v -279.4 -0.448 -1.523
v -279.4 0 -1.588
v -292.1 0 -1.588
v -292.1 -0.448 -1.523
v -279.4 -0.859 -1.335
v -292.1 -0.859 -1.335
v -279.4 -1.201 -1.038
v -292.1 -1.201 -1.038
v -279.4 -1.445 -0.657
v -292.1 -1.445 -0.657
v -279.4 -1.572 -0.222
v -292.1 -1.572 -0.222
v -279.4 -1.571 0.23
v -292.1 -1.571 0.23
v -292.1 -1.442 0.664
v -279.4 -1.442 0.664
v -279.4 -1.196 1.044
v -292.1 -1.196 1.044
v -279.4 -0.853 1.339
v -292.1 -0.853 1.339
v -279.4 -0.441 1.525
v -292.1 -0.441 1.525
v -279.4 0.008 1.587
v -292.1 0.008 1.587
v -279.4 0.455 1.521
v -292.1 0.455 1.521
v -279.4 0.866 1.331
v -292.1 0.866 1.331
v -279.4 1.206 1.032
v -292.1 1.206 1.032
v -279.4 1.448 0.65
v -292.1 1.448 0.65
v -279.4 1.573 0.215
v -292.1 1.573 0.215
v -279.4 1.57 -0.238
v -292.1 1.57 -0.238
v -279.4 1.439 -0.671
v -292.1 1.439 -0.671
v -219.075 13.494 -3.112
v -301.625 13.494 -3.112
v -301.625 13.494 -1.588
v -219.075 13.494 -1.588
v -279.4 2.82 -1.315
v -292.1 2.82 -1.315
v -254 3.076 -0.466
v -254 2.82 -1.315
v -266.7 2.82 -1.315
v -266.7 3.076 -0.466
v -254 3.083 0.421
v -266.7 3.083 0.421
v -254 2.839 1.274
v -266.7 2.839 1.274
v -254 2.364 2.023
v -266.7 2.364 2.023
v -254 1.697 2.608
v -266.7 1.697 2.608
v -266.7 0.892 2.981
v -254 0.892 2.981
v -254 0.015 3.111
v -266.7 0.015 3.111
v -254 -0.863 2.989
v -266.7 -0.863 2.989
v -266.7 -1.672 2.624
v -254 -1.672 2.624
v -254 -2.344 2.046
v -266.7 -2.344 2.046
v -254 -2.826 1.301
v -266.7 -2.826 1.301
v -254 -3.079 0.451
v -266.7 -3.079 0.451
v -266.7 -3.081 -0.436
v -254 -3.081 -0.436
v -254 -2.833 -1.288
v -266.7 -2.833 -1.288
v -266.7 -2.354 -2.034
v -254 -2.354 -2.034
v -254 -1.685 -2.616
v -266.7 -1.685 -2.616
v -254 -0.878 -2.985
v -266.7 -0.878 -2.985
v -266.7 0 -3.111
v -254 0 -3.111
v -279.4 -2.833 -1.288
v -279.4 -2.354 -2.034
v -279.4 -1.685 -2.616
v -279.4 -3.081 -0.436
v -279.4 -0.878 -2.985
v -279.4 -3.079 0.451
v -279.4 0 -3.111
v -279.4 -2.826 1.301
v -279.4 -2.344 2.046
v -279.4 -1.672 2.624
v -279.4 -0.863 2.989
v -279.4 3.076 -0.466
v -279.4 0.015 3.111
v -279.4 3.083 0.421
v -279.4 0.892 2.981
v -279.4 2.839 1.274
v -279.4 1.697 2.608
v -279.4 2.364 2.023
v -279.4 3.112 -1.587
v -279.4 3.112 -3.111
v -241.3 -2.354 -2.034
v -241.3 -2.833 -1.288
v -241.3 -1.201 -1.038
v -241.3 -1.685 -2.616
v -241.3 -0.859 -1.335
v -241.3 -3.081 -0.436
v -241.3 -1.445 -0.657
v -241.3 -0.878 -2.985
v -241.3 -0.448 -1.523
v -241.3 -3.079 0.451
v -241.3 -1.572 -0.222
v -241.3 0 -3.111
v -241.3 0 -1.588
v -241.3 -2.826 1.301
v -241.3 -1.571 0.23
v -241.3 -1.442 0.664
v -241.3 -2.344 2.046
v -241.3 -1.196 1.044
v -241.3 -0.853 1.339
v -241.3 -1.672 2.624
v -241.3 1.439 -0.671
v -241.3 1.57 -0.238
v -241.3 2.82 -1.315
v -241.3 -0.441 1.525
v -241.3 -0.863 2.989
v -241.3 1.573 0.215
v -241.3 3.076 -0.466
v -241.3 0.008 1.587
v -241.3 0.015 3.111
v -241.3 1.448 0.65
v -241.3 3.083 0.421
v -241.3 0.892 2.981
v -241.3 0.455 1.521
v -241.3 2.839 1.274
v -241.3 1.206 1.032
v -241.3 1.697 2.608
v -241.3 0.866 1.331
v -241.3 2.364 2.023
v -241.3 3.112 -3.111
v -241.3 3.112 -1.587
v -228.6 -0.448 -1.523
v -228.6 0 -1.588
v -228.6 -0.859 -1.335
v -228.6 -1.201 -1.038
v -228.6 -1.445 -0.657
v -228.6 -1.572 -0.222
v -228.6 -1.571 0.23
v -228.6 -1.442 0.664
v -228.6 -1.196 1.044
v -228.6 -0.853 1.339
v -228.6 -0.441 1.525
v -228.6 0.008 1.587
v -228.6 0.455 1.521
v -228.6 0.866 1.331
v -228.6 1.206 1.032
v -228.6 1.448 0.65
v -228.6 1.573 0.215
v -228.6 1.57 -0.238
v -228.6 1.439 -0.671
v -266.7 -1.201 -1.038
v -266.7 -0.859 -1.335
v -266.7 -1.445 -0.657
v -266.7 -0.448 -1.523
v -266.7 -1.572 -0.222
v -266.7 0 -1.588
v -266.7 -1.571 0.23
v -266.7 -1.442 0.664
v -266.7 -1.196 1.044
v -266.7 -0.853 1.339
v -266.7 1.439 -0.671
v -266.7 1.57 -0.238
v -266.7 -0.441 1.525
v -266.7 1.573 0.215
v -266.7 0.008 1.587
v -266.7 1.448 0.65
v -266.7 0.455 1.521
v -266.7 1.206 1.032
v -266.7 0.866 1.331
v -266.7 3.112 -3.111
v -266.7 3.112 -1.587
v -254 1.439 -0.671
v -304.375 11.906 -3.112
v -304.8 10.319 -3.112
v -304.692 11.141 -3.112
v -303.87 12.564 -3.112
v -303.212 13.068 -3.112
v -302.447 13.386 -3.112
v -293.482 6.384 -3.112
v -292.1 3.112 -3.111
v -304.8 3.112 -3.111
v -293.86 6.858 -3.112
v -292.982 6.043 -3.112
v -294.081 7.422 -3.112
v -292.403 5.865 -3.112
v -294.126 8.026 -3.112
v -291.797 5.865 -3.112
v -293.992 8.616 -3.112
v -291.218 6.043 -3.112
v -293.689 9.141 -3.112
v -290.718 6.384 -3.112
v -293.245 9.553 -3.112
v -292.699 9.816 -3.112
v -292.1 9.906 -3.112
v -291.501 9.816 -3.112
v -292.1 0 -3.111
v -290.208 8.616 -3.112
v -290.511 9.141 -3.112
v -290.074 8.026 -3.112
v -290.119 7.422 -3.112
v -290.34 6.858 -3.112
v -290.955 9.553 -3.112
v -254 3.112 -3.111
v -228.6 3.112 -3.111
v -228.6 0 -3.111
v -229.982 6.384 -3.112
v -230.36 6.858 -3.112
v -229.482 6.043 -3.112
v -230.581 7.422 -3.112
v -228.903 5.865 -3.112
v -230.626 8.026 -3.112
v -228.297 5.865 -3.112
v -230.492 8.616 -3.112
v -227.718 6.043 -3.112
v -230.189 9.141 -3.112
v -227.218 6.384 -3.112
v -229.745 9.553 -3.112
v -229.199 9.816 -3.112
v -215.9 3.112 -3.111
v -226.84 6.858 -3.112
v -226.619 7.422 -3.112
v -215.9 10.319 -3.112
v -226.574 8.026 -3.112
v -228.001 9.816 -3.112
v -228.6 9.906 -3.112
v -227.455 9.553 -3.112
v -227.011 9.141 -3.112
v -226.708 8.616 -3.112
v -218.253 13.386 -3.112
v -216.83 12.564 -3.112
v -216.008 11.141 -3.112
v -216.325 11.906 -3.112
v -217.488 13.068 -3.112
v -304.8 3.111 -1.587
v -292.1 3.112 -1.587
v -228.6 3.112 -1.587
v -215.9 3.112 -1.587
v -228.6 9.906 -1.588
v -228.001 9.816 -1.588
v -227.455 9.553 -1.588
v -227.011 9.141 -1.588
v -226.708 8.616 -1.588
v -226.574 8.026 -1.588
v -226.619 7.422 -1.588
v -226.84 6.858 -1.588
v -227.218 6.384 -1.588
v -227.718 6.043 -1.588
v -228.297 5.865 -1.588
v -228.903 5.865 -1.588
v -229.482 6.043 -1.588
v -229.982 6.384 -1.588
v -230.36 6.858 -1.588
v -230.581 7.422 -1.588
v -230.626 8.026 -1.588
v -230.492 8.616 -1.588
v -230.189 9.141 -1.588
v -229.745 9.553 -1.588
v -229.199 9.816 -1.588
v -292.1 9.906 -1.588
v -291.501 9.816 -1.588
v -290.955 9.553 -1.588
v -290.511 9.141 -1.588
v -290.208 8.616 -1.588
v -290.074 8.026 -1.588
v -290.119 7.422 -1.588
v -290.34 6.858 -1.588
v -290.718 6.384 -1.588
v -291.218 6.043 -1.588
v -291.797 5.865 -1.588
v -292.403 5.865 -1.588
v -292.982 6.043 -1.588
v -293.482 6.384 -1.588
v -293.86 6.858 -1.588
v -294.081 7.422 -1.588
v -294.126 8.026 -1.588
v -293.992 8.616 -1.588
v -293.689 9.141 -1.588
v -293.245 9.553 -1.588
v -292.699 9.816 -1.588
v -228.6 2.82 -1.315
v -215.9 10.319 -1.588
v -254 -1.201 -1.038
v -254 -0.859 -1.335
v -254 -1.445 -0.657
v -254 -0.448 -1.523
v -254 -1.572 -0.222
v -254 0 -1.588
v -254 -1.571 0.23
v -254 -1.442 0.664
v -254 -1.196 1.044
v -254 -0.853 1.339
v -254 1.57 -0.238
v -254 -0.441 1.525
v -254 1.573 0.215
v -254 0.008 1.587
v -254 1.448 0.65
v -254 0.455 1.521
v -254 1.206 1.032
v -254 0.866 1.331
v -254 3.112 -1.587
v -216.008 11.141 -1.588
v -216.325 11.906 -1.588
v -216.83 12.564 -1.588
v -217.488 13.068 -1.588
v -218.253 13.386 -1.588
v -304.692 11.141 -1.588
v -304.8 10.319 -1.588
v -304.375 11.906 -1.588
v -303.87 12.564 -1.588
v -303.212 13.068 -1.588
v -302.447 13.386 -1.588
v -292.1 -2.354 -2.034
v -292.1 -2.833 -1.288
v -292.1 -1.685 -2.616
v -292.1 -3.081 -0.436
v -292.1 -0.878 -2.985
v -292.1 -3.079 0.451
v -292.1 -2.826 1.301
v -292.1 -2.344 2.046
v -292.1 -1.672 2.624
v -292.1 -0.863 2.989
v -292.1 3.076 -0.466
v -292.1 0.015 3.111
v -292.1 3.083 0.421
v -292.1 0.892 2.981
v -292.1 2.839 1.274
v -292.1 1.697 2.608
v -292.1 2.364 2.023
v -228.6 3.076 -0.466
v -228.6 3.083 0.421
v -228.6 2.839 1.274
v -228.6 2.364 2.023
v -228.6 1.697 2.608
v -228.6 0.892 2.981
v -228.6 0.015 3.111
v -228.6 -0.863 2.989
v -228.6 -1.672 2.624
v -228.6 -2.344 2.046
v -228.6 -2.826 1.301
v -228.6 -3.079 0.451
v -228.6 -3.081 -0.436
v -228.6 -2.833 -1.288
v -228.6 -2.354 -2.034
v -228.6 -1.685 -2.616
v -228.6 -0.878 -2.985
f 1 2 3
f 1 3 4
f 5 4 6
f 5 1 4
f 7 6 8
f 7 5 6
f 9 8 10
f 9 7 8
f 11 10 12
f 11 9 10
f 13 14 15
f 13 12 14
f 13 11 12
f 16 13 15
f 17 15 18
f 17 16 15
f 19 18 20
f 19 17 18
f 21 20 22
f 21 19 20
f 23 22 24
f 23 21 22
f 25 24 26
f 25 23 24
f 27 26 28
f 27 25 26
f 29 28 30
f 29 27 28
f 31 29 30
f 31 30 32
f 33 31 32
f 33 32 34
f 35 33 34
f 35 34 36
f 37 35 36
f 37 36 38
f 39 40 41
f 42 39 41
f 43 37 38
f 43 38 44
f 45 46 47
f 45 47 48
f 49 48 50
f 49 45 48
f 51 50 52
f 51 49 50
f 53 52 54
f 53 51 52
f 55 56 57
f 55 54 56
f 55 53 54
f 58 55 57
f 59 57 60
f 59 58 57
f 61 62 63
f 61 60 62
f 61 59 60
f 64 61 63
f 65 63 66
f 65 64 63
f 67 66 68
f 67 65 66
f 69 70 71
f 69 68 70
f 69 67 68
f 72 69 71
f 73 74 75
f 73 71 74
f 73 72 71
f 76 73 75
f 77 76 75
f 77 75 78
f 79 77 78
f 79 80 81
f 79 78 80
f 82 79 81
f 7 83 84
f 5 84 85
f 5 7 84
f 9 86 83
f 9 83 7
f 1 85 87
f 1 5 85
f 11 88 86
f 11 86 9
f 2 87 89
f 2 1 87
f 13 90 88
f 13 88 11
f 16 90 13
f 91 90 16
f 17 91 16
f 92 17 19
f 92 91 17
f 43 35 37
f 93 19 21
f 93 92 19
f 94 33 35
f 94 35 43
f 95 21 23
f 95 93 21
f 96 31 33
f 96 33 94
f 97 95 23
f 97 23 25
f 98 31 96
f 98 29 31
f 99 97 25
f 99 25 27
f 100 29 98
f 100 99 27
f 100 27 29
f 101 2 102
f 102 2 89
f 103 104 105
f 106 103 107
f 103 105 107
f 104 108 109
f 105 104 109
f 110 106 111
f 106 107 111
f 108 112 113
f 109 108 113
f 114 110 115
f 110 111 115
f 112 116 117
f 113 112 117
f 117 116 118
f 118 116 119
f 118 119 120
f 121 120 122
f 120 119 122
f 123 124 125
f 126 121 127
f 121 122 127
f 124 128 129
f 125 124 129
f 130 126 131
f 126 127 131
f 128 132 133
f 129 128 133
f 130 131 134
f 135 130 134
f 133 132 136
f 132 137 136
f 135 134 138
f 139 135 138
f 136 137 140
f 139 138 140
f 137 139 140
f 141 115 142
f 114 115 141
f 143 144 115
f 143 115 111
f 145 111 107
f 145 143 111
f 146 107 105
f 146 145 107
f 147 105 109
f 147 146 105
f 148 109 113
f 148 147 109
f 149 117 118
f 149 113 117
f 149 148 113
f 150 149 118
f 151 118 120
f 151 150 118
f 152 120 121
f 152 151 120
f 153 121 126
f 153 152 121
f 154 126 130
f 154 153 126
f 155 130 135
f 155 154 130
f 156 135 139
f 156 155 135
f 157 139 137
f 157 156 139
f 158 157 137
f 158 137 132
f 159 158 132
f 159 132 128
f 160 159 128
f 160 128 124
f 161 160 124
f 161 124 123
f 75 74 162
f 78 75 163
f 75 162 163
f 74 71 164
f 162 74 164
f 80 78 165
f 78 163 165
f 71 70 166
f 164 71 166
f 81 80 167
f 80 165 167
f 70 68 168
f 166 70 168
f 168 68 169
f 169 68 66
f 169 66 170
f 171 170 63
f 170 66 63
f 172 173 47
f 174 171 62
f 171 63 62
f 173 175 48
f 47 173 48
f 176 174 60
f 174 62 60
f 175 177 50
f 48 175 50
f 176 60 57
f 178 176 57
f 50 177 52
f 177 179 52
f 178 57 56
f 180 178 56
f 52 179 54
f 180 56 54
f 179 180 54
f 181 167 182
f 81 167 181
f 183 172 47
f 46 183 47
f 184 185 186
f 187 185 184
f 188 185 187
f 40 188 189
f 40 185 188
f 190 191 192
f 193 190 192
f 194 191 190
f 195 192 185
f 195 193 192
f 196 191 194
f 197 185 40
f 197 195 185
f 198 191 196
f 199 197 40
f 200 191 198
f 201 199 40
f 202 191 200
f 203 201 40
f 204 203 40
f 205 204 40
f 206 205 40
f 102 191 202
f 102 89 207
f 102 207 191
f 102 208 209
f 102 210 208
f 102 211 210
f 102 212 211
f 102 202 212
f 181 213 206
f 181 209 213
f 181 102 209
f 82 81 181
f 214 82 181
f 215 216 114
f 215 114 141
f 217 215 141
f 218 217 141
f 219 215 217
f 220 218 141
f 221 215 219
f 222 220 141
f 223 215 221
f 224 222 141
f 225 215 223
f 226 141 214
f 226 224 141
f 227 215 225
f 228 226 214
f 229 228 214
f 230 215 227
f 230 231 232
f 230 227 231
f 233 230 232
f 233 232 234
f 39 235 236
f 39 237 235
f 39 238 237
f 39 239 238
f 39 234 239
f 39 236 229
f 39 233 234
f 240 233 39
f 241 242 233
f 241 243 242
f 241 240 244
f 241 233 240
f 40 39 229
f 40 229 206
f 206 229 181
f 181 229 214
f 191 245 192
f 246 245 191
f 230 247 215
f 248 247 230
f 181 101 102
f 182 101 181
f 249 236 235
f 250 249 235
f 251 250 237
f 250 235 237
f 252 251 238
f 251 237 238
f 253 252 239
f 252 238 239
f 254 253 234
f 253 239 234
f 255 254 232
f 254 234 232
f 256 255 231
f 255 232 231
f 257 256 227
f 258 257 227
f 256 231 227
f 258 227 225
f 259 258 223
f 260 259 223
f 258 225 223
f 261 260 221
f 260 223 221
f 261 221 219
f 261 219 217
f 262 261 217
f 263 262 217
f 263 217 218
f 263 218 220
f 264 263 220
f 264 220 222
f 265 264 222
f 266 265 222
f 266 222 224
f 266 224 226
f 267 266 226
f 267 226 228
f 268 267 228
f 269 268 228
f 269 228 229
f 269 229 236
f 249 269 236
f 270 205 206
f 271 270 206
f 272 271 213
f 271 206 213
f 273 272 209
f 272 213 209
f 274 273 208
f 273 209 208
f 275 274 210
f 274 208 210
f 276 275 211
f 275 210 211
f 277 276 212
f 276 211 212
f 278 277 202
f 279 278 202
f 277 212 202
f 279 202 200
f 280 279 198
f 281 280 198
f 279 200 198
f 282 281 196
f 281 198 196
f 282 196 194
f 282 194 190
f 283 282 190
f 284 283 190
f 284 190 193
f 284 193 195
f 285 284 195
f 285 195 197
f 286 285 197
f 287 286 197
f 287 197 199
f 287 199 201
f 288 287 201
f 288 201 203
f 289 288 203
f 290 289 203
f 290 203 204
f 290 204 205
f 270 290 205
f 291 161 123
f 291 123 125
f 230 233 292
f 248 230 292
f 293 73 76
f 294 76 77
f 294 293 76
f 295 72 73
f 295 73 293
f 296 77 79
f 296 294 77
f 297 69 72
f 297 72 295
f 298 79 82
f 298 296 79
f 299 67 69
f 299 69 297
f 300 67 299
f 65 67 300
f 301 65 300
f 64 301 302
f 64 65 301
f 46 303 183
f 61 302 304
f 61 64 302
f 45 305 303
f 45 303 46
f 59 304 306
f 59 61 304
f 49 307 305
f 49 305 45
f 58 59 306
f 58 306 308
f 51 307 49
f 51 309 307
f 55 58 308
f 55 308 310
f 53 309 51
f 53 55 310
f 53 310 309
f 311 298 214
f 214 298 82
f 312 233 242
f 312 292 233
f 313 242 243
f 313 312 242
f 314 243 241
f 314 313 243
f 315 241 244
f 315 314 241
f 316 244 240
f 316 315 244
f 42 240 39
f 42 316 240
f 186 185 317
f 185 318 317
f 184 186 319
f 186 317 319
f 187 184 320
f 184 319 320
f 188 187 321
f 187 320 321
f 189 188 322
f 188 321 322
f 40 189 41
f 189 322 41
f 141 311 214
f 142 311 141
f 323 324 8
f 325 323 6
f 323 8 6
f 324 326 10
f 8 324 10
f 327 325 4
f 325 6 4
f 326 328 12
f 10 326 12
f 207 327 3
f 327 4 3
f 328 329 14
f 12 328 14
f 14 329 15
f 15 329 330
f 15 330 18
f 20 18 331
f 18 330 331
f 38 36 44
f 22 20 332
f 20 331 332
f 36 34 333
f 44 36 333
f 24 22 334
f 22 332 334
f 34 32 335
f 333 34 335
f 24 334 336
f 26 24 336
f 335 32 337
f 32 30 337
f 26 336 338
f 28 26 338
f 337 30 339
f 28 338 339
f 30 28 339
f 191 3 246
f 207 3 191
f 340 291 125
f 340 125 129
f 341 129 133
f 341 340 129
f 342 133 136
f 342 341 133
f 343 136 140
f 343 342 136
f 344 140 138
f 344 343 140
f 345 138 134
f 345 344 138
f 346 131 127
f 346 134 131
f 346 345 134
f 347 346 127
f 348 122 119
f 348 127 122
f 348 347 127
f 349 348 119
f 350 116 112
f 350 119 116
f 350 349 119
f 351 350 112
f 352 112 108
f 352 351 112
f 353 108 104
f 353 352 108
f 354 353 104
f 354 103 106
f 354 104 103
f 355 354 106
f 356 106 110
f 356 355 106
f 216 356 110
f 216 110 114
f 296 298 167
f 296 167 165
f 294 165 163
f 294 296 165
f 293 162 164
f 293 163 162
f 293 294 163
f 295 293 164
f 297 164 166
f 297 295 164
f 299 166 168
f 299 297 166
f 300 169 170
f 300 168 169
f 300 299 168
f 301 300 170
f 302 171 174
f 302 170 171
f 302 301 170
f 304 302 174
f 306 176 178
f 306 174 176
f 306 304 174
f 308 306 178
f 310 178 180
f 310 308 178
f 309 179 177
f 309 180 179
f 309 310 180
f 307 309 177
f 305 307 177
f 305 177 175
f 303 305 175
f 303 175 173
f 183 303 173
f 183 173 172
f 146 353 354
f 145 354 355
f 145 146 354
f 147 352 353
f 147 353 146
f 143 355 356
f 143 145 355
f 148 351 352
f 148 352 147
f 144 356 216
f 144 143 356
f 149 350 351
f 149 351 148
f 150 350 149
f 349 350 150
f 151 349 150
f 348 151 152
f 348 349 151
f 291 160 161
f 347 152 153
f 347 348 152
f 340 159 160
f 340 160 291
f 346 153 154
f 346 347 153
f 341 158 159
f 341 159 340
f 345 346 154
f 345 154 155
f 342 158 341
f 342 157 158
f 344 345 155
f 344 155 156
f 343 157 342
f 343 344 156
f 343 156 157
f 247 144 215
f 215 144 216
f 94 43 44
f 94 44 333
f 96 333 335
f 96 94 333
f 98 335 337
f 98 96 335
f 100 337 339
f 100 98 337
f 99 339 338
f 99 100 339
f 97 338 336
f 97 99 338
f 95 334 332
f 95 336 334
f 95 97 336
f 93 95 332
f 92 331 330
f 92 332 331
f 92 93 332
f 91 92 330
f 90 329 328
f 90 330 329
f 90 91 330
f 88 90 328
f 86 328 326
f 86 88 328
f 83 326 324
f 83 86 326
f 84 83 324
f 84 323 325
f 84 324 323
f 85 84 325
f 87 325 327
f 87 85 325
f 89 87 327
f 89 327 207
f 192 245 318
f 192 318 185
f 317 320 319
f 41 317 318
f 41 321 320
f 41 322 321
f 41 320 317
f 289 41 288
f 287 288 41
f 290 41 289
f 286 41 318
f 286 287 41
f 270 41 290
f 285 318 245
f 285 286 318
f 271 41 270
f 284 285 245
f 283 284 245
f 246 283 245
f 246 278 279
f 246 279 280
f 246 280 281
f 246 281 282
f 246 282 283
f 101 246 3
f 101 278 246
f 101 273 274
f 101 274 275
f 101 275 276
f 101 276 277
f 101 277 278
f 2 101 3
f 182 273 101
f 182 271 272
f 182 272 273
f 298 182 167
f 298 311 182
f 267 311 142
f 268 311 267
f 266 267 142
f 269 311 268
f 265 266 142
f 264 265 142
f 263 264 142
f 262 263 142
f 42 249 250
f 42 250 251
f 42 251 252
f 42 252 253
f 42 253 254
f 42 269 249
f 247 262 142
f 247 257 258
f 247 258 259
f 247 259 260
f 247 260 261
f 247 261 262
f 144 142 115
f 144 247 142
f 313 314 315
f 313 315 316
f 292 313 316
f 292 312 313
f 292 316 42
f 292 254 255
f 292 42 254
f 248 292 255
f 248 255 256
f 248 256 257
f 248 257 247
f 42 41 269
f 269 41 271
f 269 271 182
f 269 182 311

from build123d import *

# Parameters (mm, degrees)
BOSS_EXTRUDE1_DEPTH = 304.8
SKETCH4_W           = 12.7
SKETCH4_H           = 6.223
CUT_EXTRUDE1_DEPTH  = 306.114409233
LPATTERN1_COUNT     = 24
LPATTERN1_PITCH     = 25.4
BOSS_EXTRUDE2_DEPTH = 609.6
SKETCH6_W           = 12.7
SKETCH6_H           = 6.223
CUT_EXTRUDE2_DEPTH  = 306.114409233
LPATTERN2_COUNT     = 24
LPATTERN2_PITCH     = 25.4
SKETCH7_R           = 1.5875
BOSS_EXTRUDE3_DEPTH = 609.6
CHAMFER1_SIZE       = 0.3175
CUT_EXTRUDE3_START  = -88.9
SKETCH8_W           = 11.762471384
SKETCH8_H           = 30.066276354
CUT_EXTRUDE3_DEPTH  = 521.857265411
FILLET1_R           = 3.175
SKETCH9_R           = 2.032
SKETCH9_R_2         = 2.031999998
CUT_EXTRUDE4_DEPTH  = 306.162001268


with BuildPart() as part:
    # Sketch3 → Boss-Extrude1 (new, symmetric)
    with BuildSketch(Plane(origin=(0, 0, 0), x_dir=(0, 0, -1), z_dir=(1, 0, 0))):
        with BuildLine():
            Line((1.5875, 0), (1.5875, -2.676056053))
            Line((1.5875, -2.676056053), (1.5875, -13.49375))
            Line((1.5875, -13.49375), (3.1115, -13.49375))
            Line((3.1115, -13.49375), (3.1115, 0))
            ThreePointArc((3.1115, 0), (-2.624212484, 1.671807731), (1.314976721, -2.819976679))
            Line((1.314976721, -2.819976679), (0.670906491, -1.438763612))
            ThreePointArc((0.670906491, -1.438763612), (-1.33888392, 0.852963128), (1.5875, 0))
        make_face()
    extrude(amount=BOSS_EXTRUDE1_DEPTH, both=True)

    # Sketch4 → Cut-Extrude1 (cut, symmetric)
    with BuildSketch(Plane.XY):
        with Locations((298.45, 0)):
            Rectangle(SKETCH4_W, SKETCH4_H)
    cut_extrude1 = extrude(amount=CUT_EXTRUDE1_DEPTH, both=True, mode=Mode.SUBTRACT)

    # LPattern1: Cut-Extrude1 ×24
    with Locations(*[(-i * LPATTERN1_PITCH, 0, 0) for i in range(1, LPATTERN1_COUNT)]):
        add(cut_extrude1, mode=Mode.SUBTRACT)


with BuildPart() as body_2:
    # Sketch5 → Boss-Extrude2 (new body)
    with BuildSketch(Plane(origin=(304.8, 0, 0), x_dir=(0, 0, -1), z_dir=(1, 0, 0))):
        with BuildLine():
            Line((1.5875, 13.49375), (1.5875, 2.676056053))
            Line((1.5875, 2.676056053), (1.5875, 0))
            ThreePointArc((1.5875, 0), (-1.33888392, -0.852963128), (0.670906491, 1.438763612))
            Line((0.670906491, 1.438763612), (1.314976721, 2.819976679))
            ThreePointArc((1.314976721, 2.819976679), (-2.624212484, -1.671807731), (3.1115, 0))
            Line((3.1115, 0), (3.1115, 13.49375))
            Line((3.1115, 13.49375), (1.5875, 13.49375))
        make_face()
    extrude(amount=-BOSS_EXTRUDE2_DEPTH)

    # Sketch6 → Cut-Extrude2 (cut, symmetric)
    with BuildSketch(Plane.XY):
        with Locations((285.75, 0)):
            Rectangle(SKETCH6_W, SKETCH6_H)
    cut_extrude2 = extrude(amount=CUT_EXTRUDE2_DEPTH, both=True, mode=Mode.SUBTRACT)

    # LPattern2: Cut-Extrude2 ×24
    with Locations(*[(-i * LPATTERN2_PITCH, 0, 0) for i in range(1, LPATTERN2_COUNT)]):
        add(cut_extrude2, mode=Mode.SUBTRACT)


with BuildPart() as body_3:
    # Sketch7 → Boss-Extrude3 (new body)
    with BuildSketch(Plane(origin=(304.8, 0, 0), x_dir=(0, 0, -1), z_dir=(1, 0, 0))):
        Circle(SKETCH7_R)
    extrude(amount=-BOSS_EXTRUDE3_DEPTH)

    # Chamfer1
    chamfer1_edges = [body_3.edges().sort_by_distance(p)[0] for p in [
        (304.8, 0, 1.5875),
        (-304.8, 0, 1.5875),
    ]]
    chamfer(chamfer1_edges, length=CHAMFER1_SIZE)


with BuildPart() as cut_extrude3_tool:
    # Sketch8 → Cut-Extrude3 (new, through all)
    with BuildSketch(Plane.ZY.offset(304.8).offset(CUT_EXTRUDE3_START)):
        Rectangle(SKETCH8_W, SKETCH8_H)
    extrude(amount=-CUT_EXTRUDE3_DEPTH)


with BuildPart() as part_1:
    add(part.part)

    # Cut-Extrude3: cut by cut_extrude3_tool
    add(cut_extrude3_tool.part, mode=Mode.SUBTRACT)


with BuildPart() as body_2_1:
    add(body_2.part)

    # Cut-Extrude3: cut by cut_extrude3_tool
    add(cut_extrude3_tool.part, mode=Mode.SUBTRACT)

    # Fillet1
    fillet1_edges = [body_2_1.edges().sort_by_distance(p)[0] for p in [
        (-304.8, 13.49375, -2.3495),
        (-215.9, 13.49375, -2.3495),
    ]]
    fillet(fillet1_edges, radius=FILLET1_R)

    # Sketch9 → Cut-Extrude4 (cut, through all)
    with BuildSketch(Plane(origin=(0, 0, -3.1115), x_dir=(-1, 0, 0), z_dir=(0, 0, -1))):
        with Locations(Location((228.600000002, 7.874000002, 0), (0, 0, 90))):
            Circle(SKETCH9_R)
        with Locations(Location((292.100000002, 7.874000002, 0), (0, 0, 90))):
            Circle(SKETCH9_R_2)
    extrude(amount=-CUT_EXTRUDE4_DEPTH, mode=Mode.SUBTRACT)


with BuildPart() as body_3_1:
    add(body_3.part)

    # Cut-Extrude3: cut by cut_extrude3_tool
    add(cut_extrude3_tool.part, mode=Mode.SUBTRACT)


solid = body_2_1.part
